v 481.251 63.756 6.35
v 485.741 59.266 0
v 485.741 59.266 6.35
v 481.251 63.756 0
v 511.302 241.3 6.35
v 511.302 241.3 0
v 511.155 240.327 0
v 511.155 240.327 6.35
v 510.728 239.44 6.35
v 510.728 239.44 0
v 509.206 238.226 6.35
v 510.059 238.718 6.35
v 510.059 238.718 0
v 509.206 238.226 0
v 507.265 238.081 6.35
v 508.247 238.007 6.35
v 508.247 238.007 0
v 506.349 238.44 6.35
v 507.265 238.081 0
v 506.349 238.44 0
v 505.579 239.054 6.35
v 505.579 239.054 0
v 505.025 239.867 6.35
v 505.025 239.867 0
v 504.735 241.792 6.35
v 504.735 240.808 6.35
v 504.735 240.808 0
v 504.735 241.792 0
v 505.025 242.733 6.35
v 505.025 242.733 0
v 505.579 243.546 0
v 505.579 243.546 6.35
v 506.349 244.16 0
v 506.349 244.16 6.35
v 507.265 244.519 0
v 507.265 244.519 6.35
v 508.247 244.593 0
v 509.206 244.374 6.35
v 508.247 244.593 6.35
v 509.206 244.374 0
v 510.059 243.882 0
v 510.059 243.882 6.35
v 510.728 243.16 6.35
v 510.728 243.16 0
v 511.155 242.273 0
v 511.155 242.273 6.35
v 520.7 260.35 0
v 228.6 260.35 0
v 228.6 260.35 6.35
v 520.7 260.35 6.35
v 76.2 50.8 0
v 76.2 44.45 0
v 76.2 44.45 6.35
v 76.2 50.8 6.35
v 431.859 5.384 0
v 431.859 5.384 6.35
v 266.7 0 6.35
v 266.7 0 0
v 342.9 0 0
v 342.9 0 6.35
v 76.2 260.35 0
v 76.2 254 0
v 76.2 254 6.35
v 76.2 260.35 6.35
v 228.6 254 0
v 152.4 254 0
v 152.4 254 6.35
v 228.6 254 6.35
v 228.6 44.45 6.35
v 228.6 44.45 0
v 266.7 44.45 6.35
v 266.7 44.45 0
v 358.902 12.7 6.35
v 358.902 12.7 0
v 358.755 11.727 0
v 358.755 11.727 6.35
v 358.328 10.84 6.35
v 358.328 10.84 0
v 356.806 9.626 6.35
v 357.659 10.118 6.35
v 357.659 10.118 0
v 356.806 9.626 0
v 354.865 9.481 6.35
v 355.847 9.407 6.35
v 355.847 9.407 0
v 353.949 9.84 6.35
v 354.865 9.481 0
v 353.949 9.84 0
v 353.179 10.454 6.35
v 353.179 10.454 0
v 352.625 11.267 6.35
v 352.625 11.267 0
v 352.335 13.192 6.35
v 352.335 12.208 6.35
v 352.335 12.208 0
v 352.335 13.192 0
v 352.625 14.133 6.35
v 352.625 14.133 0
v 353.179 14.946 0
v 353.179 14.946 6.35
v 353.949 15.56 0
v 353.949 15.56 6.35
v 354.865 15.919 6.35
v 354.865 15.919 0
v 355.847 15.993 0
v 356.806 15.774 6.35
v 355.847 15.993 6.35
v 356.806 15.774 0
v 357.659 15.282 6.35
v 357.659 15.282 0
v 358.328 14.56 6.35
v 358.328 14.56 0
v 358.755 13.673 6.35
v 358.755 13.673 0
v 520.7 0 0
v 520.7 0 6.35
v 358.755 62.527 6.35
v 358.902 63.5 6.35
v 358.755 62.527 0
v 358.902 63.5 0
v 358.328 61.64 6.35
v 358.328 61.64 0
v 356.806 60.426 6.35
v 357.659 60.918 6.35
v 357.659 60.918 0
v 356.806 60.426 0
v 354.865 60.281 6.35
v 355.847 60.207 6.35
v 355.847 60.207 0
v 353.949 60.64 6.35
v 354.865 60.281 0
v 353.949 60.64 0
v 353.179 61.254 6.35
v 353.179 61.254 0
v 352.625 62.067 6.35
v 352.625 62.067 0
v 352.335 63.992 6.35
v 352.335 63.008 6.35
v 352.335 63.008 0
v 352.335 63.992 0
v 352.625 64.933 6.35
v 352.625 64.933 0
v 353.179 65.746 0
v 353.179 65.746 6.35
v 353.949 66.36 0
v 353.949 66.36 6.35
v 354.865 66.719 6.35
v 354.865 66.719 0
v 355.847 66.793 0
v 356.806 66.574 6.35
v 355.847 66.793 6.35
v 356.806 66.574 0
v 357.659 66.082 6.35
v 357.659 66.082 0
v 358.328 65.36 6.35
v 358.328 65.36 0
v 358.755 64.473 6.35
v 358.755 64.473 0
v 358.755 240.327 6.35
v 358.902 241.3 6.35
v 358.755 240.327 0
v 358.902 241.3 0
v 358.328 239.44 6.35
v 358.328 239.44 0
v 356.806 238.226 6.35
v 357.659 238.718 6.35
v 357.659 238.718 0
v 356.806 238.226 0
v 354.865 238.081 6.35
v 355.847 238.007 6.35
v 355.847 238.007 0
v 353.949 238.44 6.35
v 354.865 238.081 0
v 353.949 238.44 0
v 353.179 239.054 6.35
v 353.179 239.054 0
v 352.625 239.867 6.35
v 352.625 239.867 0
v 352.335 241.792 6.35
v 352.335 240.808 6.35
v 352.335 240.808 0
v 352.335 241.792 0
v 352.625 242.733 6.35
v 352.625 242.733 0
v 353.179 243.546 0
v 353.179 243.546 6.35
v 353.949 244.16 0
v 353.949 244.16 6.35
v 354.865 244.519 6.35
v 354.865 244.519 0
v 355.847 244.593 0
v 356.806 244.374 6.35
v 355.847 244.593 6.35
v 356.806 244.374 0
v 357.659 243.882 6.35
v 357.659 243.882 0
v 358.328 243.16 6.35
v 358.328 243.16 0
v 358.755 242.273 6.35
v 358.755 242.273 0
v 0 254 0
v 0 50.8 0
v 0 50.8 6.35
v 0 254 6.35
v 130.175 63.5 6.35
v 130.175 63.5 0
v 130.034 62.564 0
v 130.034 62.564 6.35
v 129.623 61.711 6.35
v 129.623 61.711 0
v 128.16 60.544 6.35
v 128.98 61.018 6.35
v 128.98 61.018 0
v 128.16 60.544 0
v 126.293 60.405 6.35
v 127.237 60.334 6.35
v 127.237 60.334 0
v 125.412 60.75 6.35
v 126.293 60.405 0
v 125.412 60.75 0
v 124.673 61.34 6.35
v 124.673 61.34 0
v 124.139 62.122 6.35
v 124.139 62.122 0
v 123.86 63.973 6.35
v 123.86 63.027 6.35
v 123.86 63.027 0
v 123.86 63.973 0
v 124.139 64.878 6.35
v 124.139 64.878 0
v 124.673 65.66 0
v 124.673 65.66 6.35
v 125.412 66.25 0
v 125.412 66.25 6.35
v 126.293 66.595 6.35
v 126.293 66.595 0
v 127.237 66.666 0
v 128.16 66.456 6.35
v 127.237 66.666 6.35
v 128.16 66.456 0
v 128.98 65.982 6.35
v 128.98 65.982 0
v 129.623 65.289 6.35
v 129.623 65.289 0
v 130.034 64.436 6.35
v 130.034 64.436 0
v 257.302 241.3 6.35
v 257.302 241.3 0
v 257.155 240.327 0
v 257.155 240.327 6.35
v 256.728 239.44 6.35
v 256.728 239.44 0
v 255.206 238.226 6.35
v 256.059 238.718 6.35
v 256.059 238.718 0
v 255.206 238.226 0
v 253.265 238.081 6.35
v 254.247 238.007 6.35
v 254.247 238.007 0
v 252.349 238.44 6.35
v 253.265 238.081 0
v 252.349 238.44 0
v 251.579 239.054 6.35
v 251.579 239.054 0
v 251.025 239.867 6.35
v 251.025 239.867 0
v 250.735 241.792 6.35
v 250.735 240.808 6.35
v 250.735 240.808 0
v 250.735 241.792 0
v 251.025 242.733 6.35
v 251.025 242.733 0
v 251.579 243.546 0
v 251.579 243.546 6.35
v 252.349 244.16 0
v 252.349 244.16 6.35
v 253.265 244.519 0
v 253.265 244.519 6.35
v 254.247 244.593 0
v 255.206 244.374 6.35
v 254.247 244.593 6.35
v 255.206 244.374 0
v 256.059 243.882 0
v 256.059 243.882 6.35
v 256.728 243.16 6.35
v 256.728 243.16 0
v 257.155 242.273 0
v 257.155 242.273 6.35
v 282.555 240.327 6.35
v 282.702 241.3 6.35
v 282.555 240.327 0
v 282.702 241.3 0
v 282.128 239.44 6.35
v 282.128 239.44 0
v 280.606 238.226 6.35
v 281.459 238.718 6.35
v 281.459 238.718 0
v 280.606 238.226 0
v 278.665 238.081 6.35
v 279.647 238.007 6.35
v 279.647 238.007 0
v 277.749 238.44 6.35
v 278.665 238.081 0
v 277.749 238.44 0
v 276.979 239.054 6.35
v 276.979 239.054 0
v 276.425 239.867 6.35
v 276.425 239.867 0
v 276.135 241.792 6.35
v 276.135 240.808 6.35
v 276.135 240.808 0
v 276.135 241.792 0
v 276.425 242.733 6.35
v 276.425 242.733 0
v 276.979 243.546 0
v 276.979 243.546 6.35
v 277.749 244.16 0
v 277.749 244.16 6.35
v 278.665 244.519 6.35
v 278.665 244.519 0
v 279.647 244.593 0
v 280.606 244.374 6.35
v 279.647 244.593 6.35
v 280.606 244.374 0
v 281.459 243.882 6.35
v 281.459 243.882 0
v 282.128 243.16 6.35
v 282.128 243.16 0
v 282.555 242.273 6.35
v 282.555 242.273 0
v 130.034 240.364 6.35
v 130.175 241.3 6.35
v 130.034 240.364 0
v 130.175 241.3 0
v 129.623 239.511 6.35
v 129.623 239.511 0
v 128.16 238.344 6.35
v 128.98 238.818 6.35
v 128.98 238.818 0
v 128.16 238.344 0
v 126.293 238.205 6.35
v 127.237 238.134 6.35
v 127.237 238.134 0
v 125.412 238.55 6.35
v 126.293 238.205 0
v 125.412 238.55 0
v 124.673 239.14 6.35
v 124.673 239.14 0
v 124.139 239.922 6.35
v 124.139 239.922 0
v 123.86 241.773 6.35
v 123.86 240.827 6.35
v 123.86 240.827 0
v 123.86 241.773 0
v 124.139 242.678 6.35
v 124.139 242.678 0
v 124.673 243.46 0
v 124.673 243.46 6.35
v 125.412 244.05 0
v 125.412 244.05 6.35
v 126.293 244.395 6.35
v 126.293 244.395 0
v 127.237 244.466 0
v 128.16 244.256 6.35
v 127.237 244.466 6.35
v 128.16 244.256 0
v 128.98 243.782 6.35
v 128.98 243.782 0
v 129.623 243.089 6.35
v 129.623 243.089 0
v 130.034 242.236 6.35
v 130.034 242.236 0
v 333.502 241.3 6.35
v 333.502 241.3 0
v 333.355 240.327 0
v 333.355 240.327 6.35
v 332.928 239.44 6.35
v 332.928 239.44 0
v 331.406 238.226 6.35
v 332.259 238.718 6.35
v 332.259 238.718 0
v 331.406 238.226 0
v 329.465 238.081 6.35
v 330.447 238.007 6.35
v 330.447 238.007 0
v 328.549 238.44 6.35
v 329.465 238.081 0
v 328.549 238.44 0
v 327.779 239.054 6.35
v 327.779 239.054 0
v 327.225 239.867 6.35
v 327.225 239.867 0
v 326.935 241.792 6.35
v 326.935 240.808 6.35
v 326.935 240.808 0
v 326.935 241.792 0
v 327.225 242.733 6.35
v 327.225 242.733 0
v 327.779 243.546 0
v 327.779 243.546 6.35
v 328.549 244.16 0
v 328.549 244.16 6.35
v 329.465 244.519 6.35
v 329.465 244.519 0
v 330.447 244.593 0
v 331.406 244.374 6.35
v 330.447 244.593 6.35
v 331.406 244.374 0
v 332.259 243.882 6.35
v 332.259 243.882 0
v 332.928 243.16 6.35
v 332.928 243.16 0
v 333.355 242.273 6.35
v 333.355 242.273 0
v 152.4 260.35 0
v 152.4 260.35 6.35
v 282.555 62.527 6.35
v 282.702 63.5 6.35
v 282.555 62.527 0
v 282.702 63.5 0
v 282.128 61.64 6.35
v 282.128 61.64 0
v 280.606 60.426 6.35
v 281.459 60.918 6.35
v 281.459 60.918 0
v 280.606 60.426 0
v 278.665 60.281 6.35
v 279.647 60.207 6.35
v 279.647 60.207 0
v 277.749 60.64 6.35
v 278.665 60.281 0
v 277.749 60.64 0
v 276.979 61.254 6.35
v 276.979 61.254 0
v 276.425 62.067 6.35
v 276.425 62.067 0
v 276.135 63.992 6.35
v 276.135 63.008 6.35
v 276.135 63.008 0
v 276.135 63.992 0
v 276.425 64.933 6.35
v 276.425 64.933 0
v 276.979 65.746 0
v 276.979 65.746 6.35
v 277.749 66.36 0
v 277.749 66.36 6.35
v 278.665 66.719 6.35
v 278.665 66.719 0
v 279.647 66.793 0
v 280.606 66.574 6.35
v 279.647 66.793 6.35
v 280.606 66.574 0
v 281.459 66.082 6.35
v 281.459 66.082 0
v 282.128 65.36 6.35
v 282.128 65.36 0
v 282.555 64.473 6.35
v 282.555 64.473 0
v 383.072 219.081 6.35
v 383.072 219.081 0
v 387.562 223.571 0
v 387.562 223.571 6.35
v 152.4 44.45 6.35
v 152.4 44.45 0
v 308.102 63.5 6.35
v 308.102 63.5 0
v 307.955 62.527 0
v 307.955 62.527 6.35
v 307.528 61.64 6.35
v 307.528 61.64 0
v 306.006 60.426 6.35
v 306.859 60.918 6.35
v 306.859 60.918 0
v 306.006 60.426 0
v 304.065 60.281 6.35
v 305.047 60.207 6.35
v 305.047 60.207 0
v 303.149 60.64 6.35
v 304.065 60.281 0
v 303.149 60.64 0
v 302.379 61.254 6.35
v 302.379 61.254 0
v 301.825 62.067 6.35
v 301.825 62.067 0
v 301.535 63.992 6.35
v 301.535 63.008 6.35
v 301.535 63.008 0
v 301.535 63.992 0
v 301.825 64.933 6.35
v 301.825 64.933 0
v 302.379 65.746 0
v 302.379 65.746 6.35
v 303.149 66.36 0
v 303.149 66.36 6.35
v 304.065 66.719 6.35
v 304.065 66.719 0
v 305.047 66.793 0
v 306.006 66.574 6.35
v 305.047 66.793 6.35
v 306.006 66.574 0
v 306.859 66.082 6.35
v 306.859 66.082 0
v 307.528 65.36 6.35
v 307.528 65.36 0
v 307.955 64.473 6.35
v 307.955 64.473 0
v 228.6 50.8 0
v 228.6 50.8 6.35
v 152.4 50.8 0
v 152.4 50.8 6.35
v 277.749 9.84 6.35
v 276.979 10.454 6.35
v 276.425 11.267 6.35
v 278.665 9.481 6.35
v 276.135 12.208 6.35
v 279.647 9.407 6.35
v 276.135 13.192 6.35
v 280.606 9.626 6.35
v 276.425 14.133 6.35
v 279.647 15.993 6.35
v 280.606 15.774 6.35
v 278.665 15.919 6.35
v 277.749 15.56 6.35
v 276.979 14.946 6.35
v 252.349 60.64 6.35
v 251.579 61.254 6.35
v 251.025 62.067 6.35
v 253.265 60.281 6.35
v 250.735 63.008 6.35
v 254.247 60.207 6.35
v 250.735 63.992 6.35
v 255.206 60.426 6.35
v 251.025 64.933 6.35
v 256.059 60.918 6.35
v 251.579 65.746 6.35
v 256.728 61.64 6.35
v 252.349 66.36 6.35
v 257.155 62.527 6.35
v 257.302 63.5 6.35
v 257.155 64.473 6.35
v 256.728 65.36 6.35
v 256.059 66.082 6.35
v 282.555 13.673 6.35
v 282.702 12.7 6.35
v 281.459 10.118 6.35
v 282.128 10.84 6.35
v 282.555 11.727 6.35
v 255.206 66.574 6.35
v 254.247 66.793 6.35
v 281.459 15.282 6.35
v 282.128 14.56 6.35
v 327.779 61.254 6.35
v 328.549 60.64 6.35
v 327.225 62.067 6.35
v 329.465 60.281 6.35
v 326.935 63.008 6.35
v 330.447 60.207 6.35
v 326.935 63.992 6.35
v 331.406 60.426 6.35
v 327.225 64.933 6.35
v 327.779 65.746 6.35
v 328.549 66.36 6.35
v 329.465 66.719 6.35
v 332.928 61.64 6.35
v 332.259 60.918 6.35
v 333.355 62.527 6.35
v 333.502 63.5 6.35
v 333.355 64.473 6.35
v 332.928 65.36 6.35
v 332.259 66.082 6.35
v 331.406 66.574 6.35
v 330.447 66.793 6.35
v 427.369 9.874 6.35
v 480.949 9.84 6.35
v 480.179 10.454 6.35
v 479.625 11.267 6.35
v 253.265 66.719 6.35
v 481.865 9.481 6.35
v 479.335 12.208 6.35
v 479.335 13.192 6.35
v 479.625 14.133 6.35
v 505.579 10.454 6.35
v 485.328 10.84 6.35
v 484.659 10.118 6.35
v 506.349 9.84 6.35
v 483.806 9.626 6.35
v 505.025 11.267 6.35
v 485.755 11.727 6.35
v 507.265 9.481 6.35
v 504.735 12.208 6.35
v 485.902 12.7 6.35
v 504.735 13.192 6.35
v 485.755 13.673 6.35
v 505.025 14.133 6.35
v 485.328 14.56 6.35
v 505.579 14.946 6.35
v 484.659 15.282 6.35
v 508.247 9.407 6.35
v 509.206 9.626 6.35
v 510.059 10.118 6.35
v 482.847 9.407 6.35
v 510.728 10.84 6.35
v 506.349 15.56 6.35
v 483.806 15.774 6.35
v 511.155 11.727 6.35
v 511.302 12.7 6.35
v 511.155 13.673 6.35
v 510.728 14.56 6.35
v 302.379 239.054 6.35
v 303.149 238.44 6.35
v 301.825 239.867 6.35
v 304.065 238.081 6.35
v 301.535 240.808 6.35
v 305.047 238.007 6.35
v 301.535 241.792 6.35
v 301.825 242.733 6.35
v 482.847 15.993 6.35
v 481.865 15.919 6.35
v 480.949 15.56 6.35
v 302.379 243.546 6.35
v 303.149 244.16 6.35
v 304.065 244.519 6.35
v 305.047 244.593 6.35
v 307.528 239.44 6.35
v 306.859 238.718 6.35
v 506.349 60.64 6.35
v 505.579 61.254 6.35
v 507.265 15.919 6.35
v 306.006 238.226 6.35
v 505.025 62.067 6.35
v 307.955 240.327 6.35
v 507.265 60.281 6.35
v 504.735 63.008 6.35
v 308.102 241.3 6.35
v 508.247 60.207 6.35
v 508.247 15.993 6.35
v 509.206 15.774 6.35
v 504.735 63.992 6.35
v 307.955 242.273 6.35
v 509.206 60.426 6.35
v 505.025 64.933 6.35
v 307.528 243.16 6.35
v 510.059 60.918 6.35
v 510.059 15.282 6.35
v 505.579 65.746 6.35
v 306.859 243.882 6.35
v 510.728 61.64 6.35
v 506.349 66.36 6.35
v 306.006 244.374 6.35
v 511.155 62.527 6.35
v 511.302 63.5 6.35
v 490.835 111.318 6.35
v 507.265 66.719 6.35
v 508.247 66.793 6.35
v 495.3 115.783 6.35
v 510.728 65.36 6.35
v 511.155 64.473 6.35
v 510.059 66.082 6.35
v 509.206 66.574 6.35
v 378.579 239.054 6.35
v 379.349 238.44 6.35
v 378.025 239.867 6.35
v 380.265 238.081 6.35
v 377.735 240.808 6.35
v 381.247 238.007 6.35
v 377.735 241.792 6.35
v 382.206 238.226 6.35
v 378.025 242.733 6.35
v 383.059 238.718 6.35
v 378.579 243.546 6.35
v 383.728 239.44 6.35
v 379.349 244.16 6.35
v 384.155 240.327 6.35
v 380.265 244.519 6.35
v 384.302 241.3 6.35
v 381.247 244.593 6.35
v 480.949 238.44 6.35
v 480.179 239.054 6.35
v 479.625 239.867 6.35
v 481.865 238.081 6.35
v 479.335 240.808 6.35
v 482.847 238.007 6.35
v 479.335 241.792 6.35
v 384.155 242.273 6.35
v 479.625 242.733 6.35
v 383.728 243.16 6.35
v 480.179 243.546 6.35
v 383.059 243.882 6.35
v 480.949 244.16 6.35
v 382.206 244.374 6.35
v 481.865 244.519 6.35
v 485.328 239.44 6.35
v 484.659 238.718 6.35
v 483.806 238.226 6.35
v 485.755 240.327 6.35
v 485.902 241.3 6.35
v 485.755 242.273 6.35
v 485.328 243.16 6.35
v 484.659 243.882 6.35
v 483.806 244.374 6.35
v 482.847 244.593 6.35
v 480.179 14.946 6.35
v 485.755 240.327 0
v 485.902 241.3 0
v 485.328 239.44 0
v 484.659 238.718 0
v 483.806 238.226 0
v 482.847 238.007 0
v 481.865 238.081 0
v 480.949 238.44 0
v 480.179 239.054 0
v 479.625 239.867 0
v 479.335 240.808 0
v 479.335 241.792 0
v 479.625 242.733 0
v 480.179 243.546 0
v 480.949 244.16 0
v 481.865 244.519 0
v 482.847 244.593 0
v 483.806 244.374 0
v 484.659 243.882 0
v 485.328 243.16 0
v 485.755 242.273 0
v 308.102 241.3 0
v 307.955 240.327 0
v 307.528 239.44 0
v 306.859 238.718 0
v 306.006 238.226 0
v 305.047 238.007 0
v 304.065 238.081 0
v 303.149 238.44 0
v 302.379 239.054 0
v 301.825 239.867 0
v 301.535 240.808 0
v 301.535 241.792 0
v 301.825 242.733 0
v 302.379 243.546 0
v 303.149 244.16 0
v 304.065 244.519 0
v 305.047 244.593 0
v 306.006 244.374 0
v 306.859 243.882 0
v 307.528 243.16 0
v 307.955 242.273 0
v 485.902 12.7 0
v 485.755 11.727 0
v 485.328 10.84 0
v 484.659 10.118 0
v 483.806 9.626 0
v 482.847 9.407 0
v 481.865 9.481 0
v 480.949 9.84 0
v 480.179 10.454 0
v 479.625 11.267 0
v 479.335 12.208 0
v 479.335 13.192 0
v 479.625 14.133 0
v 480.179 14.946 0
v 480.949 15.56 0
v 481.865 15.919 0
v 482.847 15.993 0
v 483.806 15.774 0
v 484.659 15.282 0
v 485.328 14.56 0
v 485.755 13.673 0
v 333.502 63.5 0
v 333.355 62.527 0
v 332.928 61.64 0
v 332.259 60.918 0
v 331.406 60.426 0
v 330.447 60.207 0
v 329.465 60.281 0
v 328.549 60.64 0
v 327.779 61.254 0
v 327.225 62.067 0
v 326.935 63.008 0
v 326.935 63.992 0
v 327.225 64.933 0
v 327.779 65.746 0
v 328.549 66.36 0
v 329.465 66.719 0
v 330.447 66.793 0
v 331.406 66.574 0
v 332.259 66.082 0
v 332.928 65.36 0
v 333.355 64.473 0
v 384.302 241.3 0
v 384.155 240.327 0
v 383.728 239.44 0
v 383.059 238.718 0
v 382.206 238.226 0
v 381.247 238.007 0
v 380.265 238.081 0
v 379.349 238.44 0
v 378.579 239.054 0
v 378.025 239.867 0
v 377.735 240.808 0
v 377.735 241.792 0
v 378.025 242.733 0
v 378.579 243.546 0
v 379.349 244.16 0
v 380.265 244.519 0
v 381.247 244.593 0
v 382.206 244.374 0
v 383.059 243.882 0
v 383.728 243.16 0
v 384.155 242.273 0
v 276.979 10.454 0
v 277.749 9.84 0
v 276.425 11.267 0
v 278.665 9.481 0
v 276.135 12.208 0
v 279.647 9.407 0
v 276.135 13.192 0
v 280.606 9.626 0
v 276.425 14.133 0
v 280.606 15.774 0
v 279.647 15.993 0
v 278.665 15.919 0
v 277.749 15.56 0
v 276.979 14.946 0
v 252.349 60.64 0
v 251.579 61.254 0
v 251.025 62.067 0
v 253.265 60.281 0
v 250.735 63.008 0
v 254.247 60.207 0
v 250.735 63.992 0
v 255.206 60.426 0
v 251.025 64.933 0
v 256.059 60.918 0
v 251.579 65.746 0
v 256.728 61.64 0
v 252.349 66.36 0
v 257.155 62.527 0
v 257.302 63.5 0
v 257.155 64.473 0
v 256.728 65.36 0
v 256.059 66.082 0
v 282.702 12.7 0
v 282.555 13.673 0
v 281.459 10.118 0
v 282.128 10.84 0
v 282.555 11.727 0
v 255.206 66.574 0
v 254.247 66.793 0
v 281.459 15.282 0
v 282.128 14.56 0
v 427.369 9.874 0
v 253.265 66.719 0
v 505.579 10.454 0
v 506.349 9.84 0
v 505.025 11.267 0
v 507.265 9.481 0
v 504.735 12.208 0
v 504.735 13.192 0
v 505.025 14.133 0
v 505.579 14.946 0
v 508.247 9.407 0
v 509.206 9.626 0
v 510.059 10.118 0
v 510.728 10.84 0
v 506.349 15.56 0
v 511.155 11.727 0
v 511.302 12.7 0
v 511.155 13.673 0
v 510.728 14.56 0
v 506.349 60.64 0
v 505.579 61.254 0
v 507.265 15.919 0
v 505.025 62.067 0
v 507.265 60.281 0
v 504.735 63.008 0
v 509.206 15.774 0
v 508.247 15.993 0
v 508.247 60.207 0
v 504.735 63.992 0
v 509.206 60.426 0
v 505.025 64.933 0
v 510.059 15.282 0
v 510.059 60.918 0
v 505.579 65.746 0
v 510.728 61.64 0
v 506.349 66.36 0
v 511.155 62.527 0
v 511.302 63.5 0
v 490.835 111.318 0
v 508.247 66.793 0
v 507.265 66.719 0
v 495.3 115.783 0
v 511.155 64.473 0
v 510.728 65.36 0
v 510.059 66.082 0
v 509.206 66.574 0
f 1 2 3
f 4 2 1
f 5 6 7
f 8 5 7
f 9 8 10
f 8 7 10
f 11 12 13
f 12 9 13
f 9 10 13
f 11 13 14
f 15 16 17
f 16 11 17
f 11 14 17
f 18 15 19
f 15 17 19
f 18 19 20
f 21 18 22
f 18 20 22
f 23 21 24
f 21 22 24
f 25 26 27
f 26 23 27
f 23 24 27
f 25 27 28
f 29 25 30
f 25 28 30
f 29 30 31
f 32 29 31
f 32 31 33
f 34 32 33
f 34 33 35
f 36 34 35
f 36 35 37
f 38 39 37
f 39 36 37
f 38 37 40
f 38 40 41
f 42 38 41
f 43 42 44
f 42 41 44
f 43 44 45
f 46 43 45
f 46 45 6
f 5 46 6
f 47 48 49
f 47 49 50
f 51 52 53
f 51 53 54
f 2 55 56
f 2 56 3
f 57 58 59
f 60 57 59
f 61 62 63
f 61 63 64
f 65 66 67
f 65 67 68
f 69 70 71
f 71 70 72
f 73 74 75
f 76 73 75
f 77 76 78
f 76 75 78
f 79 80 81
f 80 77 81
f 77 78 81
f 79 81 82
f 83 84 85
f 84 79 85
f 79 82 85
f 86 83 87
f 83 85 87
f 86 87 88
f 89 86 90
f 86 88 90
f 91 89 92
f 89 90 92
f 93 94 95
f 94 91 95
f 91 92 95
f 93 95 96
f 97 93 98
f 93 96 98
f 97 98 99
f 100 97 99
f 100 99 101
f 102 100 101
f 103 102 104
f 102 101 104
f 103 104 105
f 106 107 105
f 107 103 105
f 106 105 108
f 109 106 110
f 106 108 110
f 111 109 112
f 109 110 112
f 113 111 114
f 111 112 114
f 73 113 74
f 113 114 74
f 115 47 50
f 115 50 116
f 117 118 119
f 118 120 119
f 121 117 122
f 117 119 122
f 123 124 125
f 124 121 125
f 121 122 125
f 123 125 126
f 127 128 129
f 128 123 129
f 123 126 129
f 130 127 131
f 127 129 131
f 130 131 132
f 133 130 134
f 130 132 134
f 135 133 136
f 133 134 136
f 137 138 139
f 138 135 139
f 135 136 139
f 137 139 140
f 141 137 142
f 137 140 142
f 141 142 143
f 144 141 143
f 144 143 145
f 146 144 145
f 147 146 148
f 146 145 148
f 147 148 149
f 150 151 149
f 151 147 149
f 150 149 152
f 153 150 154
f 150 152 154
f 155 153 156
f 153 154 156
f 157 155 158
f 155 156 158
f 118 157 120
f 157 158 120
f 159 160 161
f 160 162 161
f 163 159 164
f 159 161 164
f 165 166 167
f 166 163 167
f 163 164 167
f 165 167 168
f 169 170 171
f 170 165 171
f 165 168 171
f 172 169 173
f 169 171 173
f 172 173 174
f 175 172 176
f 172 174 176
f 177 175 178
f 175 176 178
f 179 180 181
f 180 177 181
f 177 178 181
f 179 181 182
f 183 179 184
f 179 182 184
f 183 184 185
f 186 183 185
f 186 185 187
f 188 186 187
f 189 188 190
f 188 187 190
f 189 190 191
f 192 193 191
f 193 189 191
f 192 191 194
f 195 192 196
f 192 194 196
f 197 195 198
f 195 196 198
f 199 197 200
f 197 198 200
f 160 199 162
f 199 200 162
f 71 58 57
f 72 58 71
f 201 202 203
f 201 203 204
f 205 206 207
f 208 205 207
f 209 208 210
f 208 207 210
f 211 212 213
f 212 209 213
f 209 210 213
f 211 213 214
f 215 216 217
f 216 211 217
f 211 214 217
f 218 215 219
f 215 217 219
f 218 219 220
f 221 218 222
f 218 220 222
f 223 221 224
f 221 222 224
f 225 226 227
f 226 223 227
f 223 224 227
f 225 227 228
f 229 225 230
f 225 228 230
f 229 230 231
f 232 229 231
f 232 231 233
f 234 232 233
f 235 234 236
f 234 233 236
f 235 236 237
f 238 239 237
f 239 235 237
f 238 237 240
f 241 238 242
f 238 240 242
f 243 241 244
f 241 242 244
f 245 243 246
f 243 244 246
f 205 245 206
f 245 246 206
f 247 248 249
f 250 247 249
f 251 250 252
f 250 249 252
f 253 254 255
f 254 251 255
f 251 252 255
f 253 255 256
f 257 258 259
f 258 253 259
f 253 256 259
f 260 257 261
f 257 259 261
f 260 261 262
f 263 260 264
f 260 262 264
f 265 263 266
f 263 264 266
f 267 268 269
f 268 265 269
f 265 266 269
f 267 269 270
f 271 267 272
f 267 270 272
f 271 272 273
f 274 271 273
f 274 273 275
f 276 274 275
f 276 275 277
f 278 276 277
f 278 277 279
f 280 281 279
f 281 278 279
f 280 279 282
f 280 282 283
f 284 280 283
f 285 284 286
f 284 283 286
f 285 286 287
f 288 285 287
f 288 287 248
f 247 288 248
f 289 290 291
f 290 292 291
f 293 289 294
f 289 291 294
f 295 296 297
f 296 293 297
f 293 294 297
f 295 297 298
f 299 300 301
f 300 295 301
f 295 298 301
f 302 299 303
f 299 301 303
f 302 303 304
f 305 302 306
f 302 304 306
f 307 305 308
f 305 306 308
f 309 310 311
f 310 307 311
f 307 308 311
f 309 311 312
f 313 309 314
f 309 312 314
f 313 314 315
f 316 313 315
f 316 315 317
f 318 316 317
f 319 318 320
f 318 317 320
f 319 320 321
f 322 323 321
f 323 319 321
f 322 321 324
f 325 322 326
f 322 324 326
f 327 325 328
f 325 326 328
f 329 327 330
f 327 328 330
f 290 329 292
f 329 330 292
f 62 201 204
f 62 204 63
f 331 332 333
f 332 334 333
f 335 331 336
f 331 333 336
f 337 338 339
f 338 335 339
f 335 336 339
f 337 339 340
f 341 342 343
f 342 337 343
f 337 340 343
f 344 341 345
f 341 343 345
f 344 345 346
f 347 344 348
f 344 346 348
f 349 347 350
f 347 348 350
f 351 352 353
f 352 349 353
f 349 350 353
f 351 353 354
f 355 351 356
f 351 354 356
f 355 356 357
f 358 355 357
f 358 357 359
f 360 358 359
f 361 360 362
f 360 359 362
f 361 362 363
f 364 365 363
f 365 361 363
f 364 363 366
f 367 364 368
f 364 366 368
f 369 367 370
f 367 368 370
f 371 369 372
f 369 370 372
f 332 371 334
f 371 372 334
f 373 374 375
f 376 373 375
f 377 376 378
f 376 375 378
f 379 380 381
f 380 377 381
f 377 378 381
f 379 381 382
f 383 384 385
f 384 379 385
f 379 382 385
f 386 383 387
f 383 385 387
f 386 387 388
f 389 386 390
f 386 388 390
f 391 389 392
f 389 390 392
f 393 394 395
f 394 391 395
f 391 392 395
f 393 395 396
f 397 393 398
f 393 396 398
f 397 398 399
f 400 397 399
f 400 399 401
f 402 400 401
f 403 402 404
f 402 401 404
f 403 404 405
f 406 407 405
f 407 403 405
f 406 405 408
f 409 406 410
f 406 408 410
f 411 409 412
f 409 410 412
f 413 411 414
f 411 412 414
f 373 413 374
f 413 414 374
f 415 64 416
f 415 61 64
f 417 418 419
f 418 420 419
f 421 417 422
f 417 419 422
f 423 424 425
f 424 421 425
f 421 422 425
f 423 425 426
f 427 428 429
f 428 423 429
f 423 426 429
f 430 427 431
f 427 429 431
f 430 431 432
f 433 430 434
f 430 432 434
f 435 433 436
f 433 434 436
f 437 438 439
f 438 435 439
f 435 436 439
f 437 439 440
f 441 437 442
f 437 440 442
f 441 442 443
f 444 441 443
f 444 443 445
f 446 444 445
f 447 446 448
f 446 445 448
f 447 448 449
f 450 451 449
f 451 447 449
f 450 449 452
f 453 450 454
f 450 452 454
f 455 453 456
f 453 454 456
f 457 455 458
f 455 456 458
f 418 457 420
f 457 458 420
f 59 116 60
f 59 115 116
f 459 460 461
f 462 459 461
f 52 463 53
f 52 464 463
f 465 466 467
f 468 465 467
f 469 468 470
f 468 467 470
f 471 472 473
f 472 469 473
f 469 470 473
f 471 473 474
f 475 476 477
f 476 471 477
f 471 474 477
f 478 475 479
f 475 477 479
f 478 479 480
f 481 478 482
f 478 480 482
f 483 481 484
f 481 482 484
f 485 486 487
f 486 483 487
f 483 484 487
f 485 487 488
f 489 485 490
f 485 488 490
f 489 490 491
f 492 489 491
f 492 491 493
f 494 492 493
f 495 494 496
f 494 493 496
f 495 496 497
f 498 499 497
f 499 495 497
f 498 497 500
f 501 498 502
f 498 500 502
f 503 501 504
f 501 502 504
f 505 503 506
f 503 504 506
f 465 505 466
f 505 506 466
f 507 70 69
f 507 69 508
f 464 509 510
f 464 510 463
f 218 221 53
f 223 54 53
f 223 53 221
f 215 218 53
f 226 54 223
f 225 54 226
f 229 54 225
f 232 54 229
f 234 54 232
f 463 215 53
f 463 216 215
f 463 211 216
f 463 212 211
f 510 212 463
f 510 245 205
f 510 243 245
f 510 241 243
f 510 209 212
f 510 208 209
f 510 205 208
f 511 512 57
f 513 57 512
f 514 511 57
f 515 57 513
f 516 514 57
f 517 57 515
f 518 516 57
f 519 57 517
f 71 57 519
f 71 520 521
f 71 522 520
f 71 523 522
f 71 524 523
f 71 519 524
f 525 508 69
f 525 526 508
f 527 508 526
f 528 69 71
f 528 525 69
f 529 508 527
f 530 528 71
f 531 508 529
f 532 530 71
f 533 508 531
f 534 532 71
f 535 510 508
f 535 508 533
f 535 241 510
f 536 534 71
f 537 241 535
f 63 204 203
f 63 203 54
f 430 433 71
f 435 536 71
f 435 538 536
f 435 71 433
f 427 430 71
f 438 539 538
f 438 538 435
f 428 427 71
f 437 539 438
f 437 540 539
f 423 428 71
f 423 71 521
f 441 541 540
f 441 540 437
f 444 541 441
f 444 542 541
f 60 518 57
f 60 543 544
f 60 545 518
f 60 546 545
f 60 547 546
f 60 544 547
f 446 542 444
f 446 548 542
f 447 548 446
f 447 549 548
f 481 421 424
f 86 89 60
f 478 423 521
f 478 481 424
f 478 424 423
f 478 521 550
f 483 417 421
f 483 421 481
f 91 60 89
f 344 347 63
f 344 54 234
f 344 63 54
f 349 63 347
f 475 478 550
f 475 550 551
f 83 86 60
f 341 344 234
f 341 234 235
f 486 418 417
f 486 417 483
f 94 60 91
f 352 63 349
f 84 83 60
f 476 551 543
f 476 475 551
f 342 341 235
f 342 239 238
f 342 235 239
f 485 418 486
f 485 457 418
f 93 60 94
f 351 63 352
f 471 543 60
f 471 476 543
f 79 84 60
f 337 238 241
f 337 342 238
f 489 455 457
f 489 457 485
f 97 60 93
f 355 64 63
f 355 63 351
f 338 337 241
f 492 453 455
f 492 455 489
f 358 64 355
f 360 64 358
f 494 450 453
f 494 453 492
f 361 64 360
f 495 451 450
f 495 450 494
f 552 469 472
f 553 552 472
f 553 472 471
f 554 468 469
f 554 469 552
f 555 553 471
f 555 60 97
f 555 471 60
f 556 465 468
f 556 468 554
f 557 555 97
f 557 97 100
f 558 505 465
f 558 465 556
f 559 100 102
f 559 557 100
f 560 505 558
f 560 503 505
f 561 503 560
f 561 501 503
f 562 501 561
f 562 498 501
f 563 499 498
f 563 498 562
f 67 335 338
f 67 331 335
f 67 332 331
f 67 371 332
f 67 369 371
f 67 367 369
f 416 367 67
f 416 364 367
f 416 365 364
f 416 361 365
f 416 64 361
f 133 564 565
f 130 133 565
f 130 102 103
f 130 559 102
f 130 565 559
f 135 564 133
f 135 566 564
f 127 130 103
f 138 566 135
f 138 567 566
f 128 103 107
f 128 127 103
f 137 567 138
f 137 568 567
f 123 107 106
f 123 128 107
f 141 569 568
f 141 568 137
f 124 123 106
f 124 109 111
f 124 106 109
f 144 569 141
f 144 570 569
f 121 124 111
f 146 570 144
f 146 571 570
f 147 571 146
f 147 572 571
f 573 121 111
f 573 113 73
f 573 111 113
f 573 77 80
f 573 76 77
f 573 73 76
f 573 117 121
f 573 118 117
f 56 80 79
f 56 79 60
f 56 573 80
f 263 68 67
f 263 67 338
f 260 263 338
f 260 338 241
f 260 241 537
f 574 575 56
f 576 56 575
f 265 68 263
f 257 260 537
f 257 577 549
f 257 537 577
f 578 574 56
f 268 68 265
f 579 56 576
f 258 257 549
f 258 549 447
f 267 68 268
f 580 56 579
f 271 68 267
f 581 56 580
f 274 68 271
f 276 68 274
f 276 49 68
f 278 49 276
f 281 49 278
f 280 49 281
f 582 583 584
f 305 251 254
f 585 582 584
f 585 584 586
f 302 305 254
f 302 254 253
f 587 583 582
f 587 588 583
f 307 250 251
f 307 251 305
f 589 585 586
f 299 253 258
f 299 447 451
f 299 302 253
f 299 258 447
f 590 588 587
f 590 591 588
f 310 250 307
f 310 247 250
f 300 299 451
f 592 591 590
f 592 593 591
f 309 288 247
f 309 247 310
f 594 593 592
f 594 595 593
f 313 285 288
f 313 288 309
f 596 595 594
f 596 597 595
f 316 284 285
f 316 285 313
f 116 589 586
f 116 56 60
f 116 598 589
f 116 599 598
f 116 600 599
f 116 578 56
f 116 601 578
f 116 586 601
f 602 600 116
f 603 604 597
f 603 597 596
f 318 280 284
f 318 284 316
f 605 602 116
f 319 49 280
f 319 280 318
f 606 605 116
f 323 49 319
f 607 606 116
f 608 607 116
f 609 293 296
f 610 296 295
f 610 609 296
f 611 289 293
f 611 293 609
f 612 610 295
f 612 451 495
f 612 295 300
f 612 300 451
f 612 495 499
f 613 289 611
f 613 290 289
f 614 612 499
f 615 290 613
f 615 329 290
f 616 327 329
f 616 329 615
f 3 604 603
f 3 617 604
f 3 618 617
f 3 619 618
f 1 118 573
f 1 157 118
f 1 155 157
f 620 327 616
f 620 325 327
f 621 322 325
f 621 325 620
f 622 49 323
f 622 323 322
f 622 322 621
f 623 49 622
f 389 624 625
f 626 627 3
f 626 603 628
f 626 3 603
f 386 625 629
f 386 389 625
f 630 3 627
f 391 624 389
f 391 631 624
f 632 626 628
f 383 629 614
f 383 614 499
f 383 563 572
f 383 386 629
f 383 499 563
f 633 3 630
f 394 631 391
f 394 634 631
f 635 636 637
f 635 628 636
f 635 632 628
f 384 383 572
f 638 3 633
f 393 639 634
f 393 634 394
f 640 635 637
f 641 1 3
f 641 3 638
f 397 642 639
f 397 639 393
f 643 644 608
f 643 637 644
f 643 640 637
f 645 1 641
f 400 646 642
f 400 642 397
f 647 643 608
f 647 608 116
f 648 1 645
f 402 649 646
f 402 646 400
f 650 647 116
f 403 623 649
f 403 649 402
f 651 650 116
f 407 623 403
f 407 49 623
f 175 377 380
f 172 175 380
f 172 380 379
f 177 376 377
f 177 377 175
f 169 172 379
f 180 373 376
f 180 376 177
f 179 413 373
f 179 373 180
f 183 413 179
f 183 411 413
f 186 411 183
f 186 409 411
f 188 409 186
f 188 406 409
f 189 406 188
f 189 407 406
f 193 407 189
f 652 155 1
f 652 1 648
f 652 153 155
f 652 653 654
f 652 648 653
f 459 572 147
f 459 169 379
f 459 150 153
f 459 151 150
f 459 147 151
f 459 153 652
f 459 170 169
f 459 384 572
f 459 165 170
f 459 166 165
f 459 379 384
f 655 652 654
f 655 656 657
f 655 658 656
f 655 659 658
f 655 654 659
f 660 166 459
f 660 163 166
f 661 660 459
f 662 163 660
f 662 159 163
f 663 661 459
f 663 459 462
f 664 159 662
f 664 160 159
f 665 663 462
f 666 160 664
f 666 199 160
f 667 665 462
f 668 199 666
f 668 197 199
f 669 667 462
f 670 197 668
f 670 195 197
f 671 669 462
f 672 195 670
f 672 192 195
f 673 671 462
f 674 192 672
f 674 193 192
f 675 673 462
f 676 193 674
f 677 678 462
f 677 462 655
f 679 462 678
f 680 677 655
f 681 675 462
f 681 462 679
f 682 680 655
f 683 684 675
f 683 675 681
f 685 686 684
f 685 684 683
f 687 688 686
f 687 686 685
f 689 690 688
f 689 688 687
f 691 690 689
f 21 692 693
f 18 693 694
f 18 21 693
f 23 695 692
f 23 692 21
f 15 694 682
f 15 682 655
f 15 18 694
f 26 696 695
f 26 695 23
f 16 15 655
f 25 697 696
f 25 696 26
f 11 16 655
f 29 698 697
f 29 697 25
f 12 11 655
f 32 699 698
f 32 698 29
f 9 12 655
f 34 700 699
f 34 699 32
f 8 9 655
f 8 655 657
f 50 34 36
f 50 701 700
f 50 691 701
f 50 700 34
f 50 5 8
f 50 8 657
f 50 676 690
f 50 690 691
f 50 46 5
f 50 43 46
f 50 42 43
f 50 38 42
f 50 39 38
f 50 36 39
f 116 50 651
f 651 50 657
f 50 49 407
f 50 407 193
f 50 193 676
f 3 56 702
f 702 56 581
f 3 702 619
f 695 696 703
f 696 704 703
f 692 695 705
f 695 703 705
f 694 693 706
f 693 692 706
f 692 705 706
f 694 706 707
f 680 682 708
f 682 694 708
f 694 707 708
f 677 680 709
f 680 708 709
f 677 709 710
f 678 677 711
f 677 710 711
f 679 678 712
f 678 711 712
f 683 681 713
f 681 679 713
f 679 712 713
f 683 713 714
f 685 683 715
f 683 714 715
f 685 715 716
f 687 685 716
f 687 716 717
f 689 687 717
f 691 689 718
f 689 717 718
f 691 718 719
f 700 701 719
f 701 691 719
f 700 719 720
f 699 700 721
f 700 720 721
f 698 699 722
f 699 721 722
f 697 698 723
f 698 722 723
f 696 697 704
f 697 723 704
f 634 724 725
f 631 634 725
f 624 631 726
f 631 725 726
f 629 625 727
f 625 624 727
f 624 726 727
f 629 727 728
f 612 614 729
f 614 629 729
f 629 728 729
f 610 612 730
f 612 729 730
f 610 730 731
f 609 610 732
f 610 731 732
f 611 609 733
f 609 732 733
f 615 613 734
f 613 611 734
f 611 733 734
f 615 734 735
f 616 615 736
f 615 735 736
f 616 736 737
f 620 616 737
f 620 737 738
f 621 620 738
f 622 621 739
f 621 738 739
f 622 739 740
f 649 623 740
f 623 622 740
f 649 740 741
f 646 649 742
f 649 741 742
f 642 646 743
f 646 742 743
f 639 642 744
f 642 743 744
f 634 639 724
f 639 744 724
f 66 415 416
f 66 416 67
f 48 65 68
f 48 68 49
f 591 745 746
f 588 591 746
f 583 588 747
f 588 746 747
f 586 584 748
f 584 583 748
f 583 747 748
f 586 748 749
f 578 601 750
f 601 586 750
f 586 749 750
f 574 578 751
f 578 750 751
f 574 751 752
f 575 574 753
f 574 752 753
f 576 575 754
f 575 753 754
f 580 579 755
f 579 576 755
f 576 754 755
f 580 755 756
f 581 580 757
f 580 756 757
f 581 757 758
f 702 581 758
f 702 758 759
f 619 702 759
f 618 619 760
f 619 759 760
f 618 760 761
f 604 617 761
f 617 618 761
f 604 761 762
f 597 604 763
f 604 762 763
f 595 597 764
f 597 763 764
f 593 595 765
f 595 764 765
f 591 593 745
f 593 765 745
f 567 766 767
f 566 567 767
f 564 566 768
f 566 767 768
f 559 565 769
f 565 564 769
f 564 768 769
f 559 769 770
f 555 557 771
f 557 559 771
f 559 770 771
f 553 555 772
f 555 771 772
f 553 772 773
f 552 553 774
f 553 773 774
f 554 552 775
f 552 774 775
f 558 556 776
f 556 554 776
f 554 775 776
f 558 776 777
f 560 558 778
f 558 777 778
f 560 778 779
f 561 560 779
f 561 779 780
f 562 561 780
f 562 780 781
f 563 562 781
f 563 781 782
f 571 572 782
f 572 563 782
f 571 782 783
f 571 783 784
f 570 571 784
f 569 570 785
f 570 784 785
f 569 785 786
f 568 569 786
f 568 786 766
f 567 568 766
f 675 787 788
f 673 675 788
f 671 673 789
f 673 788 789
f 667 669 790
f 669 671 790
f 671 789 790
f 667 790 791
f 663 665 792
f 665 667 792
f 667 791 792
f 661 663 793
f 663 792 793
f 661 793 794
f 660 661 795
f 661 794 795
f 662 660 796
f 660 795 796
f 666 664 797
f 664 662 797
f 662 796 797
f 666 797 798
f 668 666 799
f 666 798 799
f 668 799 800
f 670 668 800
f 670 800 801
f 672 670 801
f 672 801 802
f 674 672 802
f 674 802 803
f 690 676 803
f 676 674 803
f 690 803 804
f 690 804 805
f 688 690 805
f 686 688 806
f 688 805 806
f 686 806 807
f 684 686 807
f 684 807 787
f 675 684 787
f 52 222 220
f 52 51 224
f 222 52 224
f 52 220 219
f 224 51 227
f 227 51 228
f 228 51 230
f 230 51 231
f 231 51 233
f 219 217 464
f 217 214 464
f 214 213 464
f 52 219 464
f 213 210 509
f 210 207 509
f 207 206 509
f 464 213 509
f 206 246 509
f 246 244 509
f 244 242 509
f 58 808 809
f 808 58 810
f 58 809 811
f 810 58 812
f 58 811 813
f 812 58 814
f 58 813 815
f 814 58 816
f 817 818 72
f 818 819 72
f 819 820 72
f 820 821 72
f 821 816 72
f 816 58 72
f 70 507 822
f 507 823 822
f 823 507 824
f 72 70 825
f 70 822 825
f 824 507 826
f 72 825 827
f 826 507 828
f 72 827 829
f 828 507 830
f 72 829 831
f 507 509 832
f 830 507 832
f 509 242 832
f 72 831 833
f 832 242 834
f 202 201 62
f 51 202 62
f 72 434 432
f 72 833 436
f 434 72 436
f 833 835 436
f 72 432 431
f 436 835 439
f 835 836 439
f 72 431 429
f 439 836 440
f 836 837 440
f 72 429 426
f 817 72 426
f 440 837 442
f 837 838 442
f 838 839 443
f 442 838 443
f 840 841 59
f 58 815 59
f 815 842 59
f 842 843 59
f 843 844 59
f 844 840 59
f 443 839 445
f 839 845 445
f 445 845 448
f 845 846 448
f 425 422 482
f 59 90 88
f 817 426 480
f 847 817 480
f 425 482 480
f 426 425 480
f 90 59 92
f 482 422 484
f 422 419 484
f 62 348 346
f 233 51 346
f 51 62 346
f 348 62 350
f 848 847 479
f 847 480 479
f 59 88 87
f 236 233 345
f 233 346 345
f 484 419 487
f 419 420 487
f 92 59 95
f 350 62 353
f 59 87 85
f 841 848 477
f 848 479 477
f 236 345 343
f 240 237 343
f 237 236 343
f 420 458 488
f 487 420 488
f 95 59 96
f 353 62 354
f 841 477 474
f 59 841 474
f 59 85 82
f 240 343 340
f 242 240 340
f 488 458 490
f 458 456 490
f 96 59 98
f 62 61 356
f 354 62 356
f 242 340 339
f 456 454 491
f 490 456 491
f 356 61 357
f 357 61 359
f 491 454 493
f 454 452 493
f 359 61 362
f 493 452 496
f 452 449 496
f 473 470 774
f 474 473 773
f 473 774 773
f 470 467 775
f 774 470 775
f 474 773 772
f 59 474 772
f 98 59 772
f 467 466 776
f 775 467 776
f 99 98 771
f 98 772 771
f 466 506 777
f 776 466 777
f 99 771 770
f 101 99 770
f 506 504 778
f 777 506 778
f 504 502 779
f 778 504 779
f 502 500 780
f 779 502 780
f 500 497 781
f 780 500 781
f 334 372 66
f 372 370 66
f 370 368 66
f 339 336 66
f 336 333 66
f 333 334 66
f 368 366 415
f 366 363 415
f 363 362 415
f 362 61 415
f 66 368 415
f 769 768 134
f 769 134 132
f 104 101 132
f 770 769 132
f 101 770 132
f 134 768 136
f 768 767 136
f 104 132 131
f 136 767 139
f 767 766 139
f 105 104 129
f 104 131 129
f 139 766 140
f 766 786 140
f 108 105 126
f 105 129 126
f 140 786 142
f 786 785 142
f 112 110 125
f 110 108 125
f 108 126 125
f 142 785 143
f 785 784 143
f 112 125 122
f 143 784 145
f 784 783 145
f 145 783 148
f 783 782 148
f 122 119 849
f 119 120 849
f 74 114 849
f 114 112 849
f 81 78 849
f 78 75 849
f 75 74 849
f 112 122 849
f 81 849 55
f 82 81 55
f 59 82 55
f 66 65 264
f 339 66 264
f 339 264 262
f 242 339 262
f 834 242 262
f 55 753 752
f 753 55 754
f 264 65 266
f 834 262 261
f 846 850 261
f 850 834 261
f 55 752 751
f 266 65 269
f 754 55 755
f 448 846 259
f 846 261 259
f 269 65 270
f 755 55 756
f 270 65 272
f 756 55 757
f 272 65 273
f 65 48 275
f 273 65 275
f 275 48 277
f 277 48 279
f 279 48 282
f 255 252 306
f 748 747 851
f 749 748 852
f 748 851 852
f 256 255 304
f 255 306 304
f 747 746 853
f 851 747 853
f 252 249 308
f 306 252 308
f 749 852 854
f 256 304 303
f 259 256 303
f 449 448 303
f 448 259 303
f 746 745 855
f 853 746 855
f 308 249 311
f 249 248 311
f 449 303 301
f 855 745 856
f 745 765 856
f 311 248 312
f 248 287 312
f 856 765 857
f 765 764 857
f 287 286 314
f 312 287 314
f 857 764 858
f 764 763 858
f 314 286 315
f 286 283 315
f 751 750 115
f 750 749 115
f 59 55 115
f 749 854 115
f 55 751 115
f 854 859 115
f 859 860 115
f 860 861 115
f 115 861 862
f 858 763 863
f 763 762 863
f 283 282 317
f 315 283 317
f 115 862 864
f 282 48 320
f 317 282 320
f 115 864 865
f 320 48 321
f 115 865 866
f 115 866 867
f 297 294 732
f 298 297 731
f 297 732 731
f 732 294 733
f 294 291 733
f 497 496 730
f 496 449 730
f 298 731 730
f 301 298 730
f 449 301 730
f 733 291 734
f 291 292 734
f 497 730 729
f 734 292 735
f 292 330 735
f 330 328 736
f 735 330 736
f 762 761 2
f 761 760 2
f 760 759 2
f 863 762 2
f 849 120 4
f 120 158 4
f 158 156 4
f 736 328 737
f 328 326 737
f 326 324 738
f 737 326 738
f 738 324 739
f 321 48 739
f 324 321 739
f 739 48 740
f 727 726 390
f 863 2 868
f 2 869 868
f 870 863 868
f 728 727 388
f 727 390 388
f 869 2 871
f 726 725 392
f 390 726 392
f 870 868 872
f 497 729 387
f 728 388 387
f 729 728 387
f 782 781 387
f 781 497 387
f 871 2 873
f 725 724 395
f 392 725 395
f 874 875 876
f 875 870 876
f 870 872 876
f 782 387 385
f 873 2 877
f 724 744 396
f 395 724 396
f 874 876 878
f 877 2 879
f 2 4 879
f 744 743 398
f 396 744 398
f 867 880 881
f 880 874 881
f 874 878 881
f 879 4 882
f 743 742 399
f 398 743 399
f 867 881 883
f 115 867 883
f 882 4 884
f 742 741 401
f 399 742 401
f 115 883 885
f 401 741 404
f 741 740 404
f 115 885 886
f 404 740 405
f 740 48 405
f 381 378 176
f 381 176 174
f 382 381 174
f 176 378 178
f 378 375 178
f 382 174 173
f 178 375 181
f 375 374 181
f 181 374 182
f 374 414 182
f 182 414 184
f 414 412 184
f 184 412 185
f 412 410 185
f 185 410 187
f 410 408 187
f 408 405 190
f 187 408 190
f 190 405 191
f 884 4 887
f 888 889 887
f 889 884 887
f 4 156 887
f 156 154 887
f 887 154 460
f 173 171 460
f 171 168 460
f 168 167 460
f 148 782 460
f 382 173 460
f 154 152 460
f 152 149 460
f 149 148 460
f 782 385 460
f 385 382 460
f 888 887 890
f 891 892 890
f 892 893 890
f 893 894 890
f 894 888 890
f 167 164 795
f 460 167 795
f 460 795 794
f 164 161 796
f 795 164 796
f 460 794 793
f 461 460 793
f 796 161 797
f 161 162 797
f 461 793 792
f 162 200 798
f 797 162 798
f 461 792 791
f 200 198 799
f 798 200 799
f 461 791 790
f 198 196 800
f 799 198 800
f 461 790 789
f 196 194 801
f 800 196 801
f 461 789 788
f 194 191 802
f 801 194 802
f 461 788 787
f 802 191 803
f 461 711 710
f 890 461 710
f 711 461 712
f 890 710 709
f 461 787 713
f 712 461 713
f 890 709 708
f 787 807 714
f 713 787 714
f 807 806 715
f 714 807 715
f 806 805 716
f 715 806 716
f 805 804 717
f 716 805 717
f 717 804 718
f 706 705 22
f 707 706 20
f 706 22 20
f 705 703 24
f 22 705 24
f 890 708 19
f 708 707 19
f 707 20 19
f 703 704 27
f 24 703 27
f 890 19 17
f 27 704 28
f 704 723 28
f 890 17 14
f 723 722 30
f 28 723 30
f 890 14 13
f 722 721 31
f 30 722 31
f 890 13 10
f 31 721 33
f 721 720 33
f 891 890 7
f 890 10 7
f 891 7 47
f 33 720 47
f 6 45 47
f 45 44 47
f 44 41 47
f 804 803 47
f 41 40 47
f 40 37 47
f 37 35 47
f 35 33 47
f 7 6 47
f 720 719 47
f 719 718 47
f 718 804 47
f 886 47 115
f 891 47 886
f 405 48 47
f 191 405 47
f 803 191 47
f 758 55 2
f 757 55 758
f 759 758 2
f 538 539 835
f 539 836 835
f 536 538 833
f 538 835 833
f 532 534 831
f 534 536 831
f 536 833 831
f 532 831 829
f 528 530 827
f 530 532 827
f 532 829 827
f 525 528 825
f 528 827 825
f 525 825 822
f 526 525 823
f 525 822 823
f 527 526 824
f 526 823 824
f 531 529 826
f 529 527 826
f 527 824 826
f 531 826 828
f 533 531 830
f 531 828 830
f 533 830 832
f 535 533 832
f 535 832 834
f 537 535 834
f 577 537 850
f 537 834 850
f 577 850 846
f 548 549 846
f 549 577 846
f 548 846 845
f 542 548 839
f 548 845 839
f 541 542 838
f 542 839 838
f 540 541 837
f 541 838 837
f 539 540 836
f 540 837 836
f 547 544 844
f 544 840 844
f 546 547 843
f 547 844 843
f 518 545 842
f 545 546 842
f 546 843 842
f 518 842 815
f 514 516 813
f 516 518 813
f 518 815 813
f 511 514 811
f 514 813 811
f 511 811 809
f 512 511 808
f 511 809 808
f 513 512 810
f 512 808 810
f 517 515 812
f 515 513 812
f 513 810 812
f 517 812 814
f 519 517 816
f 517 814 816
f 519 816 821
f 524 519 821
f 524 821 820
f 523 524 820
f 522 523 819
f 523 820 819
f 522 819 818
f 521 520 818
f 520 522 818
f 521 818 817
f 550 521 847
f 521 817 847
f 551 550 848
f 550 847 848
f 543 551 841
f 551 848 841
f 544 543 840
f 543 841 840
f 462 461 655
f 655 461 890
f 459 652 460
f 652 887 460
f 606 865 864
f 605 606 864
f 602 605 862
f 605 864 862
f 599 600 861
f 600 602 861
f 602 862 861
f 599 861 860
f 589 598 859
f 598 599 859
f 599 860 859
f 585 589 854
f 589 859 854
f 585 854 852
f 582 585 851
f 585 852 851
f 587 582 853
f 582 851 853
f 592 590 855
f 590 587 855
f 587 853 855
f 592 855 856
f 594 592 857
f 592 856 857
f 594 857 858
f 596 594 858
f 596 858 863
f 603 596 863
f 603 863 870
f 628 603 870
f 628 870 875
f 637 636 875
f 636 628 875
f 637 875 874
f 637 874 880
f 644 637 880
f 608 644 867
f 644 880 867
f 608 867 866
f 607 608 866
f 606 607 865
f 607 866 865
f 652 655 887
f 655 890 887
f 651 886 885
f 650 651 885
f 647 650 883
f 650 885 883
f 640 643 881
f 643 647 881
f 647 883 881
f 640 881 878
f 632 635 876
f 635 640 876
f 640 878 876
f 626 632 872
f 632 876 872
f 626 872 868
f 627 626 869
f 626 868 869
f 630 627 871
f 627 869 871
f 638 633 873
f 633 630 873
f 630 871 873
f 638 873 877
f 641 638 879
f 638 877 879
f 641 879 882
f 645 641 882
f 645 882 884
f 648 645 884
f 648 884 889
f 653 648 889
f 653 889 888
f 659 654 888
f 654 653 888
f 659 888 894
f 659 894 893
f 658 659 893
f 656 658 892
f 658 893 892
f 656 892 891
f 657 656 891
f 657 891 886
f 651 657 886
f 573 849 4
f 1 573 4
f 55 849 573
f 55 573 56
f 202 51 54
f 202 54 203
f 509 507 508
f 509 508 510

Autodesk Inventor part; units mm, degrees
ref_plane "YZ Plane" through (0, 0, 0) normal (1, 0, 0) x (0, 1, 0)
ref_plane "XZ Plane" through (0, 0, 0) normal (0, 1, 0) x (-1, 0, 0)
ref_plane "XY Plane" through (0, 0, 0) normal (0, 0, 1) x (1, 0, 0)
sketch "Sketch1" plane through (0, 0, 0) normal (0, 0, 1) x (1, 0, 0)
  circle A0 centre (482.6, 12.7) radius 3.302
  circle A1 centre (508, 241.3) radius 3.302
  circle A2 centre (482.6, 241.3) radius 3.302
  circle A3 centre (355.6, 241.3) radius 3.302
  circle A4 centre (330.2, 241.3) radius 3.302
  circle A5 centre (127, 63.5) radius 3.175
  circle A6 centre (127, 241.3) radius 3.175
  line L0 (427.3692, 9.8745) -> (431.8594, 5.3844)
  line L1 (431.8594, 5.3844) -> (485.7409, 59.2659)
  line L2 (485.7409, 59.2659) -> (481.2508, 63.7561)
  circle A7 centre (330.2, 63.5) radius 3.302
  circle A8 centre (254, 241.3) radius 3.302
  circle A9 centre (279.4, 63.5) radius 3.302
  circle A10 centre (355.6, 63.5) radius 3.302
  circle A11 centre (508, 63.5) radius 3.302
  circle A12 centre (355.6, 12.7) radius 3.302
  circle A13 centre (508, 12.7) radius 3.302
  line L3 (0, 254) -> (76.2, 254)
  line L4 (76.2, 254) -> (76.2, 260.35)
  line L5 (76.2, 260.35) -> (152.4, 260.35)
  line L6 (152.4, 260.35) -> (152.4, 254)
  line L7 (152.4, 254) -> (228.6, 254)
  line L8 (228.6, 254) -> (228.6, 260.35)
  line L9 (228.6, 260.35) -> (520.7, 260.35)
  line L10 (520.7, 260.35) -> (520.7, 0)
  line L11 (520.7, 0) -> (342.9, 0)
  line L12 (228.6, 44.45) -> (228.6, 50.8)
  line L13 (228.6, 50.8) -> (152.4, 50.8)
  line L14 (152.4, 50.8) -> (152.4, 44.45)
  line L15 (152.4, 44.45) -> (76.2, 44.45)
  line L16 (76.2, 44.45) -> (76.2, 50.8)
  line L17 (76.2, 50.8) -> (0, 50.8)
  line L18 (0, 50.8) -> (0, 254)
  line L19 (490.8349, 111.3178) -> (383.0718, 219.0809)
  line L20 (383.0718, 219.0809) -> (387.562, 223.571)
  line L21 (387.562, 223.571) -> (495.3, 115.7829)
  line L22 (495.3, 115.7829) -> (490.8349, 111.3178)
  line L23 (427.3692, 9.8745) -> (481.2508, 63.7561)
  circle A14 centre (279.4, 241.3) radius 3.302
  circle A15 centre (381, 241.3) radius 3.302
  circle A16 centre (254, 63.5) radius 3.302
  circle A17 centre (304.8, 241.3) radius 3.302
  circle A18 centre (304.8, 63.5) radius 3.302
  line L24 (266.7, 0) -> (342.9, 0)
  line L25 (266.7, 0) -> (266.7, 44.45)
  line L26 (228.6, 44.45) -> (266.7, 44.45)
  circle A19 centre (279.4, 12.7) radius 3.302
  point P0 (0, 0)
extrude "Extrusion2" add sketch "Sketch1" along normal blind 6.35
properties part number "vrRig_v8_side"
